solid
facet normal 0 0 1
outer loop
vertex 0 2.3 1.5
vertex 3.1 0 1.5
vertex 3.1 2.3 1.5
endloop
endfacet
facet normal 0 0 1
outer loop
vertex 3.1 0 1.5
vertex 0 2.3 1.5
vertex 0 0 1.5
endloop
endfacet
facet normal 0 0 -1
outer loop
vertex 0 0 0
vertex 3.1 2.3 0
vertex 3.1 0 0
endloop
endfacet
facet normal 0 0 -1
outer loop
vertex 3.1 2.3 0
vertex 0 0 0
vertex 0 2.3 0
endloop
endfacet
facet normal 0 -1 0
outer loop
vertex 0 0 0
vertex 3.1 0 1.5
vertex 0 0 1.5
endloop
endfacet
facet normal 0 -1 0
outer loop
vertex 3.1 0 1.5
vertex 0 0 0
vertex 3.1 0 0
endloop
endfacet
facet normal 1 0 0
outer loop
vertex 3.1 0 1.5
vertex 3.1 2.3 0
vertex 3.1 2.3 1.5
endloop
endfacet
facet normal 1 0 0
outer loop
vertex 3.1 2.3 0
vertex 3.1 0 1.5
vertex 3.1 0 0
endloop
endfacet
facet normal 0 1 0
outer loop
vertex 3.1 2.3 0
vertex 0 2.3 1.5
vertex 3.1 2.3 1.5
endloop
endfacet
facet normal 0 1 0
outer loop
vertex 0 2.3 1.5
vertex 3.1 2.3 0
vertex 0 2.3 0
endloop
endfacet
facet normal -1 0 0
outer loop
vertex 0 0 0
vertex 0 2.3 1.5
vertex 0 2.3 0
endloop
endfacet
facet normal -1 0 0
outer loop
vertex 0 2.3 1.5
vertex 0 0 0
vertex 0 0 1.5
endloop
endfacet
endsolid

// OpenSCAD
$fn = 200;

min_thick=0.3;
fix = 0.1;
a_few = 2;
a_lot = 100;
outer_r=40;
inner_r=14;

inner_thick = 4;

thick=7;

overhang_width = 1;

magnet_r = 1.5;
magnet_h = 1.6;
magnet_dinstance = 0.5;

magnet_r_play = 0.3;
magnet_h_play = 1.2;

magnet_void_r = magnet_r+magnet_r_play;
magnet_void_h = magnet_h+magnet_h_play;


upright_length = 50;

traverse_thick = 5.5;
traverse_length = 22;
traverse_height=sin(45)*traverse_length;

traverse_magnet_shift = 0.1;

cap_play = 0.5;
cap_hangover = 0.5;
cap_width = magnet_void_r*2-cap_play;
cap_height = magnet_void_h-cap_play;

cap_deep = 2;

module magnet() {
    color("red")
    cylinder(r=magnet_void_r, h=magnet_void_h);
}

module magnet_void(degree=0) {
    rotate([0,0,degree])
    color("red")
    hull() {
        magnet();
        
        translate([8,0,0])
        magnet();
    }
    
//    magnet();
}



module outer_wheel() {
    difference() {    
        cylinder(r=outer_r, h=thick);
        translate([0,0,-fix])
        cylinder(r=outer_r-thick, h=thick+fix*2);
    }
}

module inner_wheel() {
    difference() {    
        cylinder(r=inner_r+inner_thick, h=inner_thick+1);
        translate([0,0,-fix])
        cylinder(r=inner_r, h=thick+fix*2);
    }
    
    difference() {    
        cylinder(r=inner_r+overhang_width, h=overhang_width);
        translate([0,0,-fix])
        cylinder(r=inner_r-overhang_width, h=overhang_width+fix*2);
    }
}





module radius() {
    translate([inner_r+a_few,-thick/2,0])
    cube([outer_r-inner_r-a_few*2,thick, inner_thick]);
}

module wheel() {
    outer_wheel();
    inner_wheel();
    radius();
    rotate([0,0,120])
    radius();
    rotate([0,0,240])
    radius();
}

module upright() {
    
    difference() {
        union() {
            translate([outer_r-thick,-thick/2,-upright_length])
            cube([thick, thick, upright_length]);
            
            translate([outer_r-thick,-traverse_thick/2,-traverse_height])
            rotate([0,-45,0])
            cube([traverse_thick, traverse_thick, traverse_length]);
        }
        
        translate([0,-a_lot/2,0])
        cube([a_lot,a_lot,a_lot]);        
    }    

}


module cap() {
    
    translate([cap_hangover,cap_hangover])
    cube([cap_width,cap_height,cap_deep]);

    cube([cap_width+cap_hangover*2,cap_height+cap_hangover*2,cap_hangover]);
}

module cap2() {
    cube([cap_width,cap_height,cap_deep-cap_hangover]);

}

module sim_upright() {
    
    difference() {
        upright();
    
        translate([outer_r-thick/2,0,-magnet_void_h - magnet_dinstance])
        magnet_void(0);
        
        translate([outer_r-thick-traverse_height+traverse_thick+traverse_magnet_shift,0, -magnet_void_h-magnet_dinstance])
        magnet_void(90);
    }
}

module sim_uprights() {
    sim_upright();
    
    rotate([0,0,120])
    sim_upright();
    

    rotate([0,0,240])
    sim_upright();
}


module sim_wheel() {
    
    module voids() {
        translate([outer_r-thick/2,0,magnet_dinstance])
        magnet_void(0);
        
        translate([outer_r-thick-traverse_height+traverse_thick+traverse_magnet_shift,0,magnet_dinstance])
        magnet_void(90);
    }
    
    difference() {
        wheel();

        voids();
        
        rotate([0,0,120])
        voids();

        rotate([0,0,240])        
        voids();
        
    }
}

module print_caps() {
    n = 1;
    m = 1;
    dinstance = 7;
    
    cube([n*dinstance+cap_width+cap_hangover*2, m*dinstance+cap_height+cap_hangover*2,min_thick/2]);
    for(i = [0:n]) {
        for(j = [0:m]) {
            translate([i*dinstance,j*dinstance,0])
            cap();
        }
    }
        
    
}

module print_upright() {
    sim_upright();
    translate([17,-7,-min_thick/2])
    cube([24,14,min_thick/2]);
}

//intersection() {
//    sim_wheel();
//    translate([outer_r-10,-5,0])
//    cube(10,10,10);
//}

//sim_wheel();

//sim_upright();
//print_upright();
//sim_uprights();

//print_caps();

//cap();

cap2();
    
